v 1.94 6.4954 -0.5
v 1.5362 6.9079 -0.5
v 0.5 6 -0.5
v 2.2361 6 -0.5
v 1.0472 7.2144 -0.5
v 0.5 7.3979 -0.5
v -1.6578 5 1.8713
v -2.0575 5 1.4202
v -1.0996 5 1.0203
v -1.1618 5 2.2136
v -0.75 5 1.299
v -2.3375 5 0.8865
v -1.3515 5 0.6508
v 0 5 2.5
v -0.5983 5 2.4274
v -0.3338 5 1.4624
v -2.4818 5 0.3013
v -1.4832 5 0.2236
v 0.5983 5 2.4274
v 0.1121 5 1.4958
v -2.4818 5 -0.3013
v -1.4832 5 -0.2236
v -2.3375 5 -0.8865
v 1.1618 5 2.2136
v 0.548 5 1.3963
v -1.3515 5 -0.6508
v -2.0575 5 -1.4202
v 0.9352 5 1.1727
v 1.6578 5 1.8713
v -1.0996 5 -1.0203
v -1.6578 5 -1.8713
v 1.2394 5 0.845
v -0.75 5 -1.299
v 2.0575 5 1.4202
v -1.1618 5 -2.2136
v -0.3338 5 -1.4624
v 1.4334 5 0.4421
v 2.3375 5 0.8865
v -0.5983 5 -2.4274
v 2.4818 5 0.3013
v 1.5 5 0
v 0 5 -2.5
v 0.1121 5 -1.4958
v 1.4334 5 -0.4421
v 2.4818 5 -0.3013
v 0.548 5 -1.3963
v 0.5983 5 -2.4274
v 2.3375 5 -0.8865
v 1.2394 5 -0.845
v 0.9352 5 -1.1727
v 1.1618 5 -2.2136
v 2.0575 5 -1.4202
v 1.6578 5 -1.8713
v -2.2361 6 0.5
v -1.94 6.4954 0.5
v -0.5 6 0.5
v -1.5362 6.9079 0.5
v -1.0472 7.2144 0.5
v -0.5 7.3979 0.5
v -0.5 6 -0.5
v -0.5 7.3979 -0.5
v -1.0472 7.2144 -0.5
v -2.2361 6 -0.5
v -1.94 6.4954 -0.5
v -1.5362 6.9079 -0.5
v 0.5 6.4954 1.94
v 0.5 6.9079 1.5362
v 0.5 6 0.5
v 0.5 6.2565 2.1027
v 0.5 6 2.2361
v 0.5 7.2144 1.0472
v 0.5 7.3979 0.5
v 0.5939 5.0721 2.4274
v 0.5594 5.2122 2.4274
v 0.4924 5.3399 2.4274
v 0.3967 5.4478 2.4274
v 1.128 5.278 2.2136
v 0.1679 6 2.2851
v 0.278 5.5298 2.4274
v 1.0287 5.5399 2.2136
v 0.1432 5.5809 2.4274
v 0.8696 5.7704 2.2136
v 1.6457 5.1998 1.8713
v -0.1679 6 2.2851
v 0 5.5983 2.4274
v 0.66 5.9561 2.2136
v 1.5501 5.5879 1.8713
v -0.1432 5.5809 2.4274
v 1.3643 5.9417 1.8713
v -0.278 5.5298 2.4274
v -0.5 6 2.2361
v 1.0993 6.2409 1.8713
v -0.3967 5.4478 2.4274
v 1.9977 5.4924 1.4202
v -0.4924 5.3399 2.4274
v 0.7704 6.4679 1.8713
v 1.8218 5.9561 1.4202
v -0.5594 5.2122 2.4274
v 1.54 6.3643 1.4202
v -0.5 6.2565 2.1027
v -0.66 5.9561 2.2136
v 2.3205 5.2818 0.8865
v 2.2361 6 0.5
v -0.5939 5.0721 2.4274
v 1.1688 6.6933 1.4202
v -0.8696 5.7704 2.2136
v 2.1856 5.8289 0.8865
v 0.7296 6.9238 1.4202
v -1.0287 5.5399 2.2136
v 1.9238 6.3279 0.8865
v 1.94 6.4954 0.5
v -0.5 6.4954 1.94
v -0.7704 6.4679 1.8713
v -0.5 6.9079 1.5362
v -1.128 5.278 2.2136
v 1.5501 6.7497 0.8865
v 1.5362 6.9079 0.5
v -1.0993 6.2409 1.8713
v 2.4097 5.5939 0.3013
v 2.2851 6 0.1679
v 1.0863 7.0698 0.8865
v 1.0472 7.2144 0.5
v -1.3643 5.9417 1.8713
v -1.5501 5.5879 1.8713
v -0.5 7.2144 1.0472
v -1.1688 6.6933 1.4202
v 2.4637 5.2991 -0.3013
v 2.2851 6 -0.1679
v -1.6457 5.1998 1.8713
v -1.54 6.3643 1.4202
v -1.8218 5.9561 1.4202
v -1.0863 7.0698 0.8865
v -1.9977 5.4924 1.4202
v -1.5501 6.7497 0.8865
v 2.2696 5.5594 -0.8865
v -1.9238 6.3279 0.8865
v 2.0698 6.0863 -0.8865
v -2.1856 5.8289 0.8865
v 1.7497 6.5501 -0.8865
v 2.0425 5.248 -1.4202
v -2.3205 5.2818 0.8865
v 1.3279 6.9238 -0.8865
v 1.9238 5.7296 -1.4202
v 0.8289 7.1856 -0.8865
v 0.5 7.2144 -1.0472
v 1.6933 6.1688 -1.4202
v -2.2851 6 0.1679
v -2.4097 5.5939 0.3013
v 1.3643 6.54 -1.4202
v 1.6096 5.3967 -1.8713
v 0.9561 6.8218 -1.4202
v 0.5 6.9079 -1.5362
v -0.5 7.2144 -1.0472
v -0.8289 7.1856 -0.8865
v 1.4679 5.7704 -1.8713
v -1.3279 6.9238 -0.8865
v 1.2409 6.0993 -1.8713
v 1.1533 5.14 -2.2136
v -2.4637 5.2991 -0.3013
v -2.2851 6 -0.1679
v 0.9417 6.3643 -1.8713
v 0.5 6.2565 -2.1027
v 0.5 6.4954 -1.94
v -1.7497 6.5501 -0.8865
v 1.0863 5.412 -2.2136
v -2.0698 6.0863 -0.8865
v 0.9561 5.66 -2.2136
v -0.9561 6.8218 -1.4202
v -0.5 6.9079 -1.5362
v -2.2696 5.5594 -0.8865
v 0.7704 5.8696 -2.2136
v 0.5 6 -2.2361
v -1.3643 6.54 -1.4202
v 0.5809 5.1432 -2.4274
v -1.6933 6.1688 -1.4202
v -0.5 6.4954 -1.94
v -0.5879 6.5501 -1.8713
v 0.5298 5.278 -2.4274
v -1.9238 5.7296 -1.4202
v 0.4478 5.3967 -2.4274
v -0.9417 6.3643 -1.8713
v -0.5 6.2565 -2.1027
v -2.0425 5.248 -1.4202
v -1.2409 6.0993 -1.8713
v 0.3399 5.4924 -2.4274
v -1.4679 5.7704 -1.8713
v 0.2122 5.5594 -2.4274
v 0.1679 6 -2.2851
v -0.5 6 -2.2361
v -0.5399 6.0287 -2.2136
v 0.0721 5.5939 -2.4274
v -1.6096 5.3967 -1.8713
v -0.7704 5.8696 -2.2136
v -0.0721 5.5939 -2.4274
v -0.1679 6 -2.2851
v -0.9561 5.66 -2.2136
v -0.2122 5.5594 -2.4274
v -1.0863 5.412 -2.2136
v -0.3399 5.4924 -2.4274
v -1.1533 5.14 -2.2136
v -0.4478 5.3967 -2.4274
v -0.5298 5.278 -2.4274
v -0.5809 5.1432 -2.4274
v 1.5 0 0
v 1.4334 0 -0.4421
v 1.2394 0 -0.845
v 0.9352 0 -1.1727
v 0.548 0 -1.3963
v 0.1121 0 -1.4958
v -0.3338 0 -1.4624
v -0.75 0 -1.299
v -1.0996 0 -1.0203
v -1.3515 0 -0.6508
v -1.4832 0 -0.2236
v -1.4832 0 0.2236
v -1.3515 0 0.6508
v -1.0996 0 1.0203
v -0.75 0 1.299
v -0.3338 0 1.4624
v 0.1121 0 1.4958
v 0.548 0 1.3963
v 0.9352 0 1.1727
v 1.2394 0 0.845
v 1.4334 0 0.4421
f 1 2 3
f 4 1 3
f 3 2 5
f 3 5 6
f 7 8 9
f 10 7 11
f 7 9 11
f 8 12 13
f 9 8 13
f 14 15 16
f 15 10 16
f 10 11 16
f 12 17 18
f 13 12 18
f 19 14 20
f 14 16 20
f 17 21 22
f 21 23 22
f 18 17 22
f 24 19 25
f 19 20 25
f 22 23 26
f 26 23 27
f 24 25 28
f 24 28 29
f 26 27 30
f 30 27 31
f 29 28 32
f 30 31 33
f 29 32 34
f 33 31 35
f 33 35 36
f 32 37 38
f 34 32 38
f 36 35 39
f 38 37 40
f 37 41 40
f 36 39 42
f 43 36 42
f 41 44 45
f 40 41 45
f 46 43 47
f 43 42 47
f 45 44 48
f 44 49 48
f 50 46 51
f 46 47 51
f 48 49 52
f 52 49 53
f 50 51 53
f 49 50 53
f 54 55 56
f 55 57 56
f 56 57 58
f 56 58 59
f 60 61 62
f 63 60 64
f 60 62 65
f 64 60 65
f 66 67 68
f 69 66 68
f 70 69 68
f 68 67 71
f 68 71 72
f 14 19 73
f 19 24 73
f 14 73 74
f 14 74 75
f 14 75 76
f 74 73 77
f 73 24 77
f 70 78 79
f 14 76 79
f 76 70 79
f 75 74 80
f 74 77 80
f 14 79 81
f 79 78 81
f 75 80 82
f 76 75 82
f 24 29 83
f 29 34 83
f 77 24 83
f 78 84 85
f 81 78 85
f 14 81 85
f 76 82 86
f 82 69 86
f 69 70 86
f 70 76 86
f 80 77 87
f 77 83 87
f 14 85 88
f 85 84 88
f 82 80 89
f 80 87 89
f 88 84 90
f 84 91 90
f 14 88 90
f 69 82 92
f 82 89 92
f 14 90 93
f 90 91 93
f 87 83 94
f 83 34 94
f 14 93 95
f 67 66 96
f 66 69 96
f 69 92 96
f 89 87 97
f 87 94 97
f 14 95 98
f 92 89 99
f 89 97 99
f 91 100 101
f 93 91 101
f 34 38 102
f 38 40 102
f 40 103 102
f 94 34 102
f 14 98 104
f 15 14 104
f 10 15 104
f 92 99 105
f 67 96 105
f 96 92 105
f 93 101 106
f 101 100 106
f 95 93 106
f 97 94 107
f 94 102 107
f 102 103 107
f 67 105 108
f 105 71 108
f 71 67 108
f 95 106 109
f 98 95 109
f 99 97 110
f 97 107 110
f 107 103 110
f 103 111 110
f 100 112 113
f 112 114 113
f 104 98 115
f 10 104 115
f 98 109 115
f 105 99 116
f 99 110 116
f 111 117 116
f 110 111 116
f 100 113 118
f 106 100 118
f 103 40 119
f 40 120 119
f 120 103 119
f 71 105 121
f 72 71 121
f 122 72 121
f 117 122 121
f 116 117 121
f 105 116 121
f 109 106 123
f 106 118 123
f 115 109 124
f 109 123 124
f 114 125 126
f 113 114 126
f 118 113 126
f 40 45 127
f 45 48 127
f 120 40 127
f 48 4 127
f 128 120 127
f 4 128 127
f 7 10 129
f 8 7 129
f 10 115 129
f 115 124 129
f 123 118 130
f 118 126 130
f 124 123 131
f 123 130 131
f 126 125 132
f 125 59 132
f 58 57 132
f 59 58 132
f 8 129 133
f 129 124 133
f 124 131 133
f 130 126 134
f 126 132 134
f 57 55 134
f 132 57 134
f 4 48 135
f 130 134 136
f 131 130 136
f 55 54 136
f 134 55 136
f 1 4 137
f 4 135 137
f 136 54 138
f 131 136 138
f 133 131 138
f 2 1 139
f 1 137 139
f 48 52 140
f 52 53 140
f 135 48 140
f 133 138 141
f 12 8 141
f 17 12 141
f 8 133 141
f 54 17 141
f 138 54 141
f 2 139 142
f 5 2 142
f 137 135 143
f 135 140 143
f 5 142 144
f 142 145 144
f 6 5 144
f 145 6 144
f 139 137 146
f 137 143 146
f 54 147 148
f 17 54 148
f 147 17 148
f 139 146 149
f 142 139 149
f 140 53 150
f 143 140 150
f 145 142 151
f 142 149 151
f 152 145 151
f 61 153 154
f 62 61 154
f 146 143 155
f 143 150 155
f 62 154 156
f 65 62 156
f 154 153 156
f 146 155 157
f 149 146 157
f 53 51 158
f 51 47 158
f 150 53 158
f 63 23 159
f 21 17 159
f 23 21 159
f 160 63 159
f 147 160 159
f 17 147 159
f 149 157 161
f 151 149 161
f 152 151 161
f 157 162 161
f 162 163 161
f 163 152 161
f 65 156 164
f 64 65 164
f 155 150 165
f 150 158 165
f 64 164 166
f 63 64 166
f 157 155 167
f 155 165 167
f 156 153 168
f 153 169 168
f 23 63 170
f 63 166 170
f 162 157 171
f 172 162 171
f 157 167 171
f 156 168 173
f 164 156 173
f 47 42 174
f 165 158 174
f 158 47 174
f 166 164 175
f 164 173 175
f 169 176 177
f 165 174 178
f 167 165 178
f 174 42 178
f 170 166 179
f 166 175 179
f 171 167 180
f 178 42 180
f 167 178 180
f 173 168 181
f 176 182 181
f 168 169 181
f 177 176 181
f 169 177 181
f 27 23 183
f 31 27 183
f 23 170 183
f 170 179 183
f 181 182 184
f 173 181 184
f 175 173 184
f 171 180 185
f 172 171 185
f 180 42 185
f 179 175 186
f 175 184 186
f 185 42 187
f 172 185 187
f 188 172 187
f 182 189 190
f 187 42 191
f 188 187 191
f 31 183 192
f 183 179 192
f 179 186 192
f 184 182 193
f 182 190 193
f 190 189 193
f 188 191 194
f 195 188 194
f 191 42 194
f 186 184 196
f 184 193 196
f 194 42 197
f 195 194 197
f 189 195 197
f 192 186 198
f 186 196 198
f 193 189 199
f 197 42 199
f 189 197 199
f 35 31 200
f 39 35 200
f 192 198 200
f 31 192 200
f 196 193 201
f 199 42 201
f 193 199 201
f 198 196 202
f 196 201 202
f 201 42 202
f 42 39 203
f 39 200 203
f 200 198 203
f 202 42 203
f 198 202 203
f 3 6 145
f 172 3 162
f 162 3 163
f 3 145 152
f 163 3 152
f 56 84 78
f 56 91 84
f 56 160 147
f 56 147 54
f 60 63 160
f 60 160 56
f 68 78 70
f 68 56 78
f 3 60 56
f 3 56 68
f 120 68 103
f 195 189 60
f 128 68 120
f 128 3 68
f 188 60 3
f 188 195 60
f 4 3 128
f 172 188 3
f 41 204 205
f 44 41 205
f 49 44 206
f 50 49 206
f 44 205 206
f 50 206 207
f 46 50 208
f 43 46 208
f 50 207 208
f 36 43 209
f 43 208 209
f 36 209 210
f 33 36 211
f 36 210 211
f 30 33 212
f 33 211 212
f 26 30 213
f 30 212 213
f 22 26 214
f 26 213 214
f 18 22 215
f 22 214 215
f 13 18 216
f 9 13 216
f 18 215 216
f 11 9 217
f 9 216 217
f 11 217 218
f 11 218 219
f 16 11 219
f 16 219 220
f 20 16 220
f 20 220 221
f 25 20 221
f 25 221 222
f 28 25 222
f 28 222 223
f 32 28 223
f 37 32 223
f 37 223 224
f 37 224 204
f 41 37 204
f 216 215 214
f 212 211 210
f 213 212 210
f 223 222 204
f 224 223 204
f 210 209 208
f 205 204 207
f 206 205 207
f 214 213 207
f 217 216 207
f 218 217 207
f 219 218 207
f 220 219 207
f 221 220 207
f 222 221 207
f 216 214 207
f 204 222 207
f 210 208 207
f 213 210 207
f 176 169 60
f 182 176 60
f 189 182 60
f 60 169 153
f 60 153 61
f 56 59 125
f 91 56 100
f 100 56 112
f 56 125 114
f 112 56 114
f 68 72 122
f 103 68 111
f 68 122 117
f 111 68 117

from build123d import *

# Parameters (mm, degrees)
SKETCH1_R           = 1.5
BOSS_EXTRUDE1_DEPTH = 5
REVOLVE1_ANGLE      = 180
CUT_EXTRUDE1_DEPTH  = 2


with BuildPart() as part:
    # Sketch1 → Boss-Extrude1 (new body)
    with BuildSketch(Plane(origin=(0, 0, 0), x_dir=(1, 0, 0), z_dir=(0, 1, 0))):
        Circle(SKETCH1_R)
    extrude(amount=BOSS_EXTRUDE1_DEPTH)

    # Sketch2 → Revolve1 (revolve)
    with BuildSketch(Plane(origin=(0, 5, 0), x_dir=(1, 0, 0), z_dir=(0, 1, 0))):
        with BuildLine():
            Line((0, 2.5), (0, -2.5))
            ThreePointArc((0, -2.5), (2.5, 0), (0, 2.5))
        make_face()
    revolve(axis=Axis((0, 5, -2.5), (0, 0, 1)), revolution_arc=REVOLVE1_ANGLE)

    # Sketch3 → Cut-Extrude1 (cut)
    with BuildSketch(Plane(origin=(0, 8, 0), x_dir=(1, 0, 0), z_dir=(0, 1, 0))):
        Polygon((-0.5, -0.5), (-0.5, -3.128554583), (0.5, -3.128554583), (0.5, -0.5), (2.950746735, -0.5), (2.950746735, 0.5), (0.5, 0.5), (0.5, 2.871445417), (-0.5, 2.871445417), (-0.5, 0.5), (-3.049253265, 0.5), (-3.049253265, -0.5), align=None)
    extrude(amount=-CUT_EXTRUDE1_DEPTH, mode=Mode.SUBTRACT)


solid = part.part
